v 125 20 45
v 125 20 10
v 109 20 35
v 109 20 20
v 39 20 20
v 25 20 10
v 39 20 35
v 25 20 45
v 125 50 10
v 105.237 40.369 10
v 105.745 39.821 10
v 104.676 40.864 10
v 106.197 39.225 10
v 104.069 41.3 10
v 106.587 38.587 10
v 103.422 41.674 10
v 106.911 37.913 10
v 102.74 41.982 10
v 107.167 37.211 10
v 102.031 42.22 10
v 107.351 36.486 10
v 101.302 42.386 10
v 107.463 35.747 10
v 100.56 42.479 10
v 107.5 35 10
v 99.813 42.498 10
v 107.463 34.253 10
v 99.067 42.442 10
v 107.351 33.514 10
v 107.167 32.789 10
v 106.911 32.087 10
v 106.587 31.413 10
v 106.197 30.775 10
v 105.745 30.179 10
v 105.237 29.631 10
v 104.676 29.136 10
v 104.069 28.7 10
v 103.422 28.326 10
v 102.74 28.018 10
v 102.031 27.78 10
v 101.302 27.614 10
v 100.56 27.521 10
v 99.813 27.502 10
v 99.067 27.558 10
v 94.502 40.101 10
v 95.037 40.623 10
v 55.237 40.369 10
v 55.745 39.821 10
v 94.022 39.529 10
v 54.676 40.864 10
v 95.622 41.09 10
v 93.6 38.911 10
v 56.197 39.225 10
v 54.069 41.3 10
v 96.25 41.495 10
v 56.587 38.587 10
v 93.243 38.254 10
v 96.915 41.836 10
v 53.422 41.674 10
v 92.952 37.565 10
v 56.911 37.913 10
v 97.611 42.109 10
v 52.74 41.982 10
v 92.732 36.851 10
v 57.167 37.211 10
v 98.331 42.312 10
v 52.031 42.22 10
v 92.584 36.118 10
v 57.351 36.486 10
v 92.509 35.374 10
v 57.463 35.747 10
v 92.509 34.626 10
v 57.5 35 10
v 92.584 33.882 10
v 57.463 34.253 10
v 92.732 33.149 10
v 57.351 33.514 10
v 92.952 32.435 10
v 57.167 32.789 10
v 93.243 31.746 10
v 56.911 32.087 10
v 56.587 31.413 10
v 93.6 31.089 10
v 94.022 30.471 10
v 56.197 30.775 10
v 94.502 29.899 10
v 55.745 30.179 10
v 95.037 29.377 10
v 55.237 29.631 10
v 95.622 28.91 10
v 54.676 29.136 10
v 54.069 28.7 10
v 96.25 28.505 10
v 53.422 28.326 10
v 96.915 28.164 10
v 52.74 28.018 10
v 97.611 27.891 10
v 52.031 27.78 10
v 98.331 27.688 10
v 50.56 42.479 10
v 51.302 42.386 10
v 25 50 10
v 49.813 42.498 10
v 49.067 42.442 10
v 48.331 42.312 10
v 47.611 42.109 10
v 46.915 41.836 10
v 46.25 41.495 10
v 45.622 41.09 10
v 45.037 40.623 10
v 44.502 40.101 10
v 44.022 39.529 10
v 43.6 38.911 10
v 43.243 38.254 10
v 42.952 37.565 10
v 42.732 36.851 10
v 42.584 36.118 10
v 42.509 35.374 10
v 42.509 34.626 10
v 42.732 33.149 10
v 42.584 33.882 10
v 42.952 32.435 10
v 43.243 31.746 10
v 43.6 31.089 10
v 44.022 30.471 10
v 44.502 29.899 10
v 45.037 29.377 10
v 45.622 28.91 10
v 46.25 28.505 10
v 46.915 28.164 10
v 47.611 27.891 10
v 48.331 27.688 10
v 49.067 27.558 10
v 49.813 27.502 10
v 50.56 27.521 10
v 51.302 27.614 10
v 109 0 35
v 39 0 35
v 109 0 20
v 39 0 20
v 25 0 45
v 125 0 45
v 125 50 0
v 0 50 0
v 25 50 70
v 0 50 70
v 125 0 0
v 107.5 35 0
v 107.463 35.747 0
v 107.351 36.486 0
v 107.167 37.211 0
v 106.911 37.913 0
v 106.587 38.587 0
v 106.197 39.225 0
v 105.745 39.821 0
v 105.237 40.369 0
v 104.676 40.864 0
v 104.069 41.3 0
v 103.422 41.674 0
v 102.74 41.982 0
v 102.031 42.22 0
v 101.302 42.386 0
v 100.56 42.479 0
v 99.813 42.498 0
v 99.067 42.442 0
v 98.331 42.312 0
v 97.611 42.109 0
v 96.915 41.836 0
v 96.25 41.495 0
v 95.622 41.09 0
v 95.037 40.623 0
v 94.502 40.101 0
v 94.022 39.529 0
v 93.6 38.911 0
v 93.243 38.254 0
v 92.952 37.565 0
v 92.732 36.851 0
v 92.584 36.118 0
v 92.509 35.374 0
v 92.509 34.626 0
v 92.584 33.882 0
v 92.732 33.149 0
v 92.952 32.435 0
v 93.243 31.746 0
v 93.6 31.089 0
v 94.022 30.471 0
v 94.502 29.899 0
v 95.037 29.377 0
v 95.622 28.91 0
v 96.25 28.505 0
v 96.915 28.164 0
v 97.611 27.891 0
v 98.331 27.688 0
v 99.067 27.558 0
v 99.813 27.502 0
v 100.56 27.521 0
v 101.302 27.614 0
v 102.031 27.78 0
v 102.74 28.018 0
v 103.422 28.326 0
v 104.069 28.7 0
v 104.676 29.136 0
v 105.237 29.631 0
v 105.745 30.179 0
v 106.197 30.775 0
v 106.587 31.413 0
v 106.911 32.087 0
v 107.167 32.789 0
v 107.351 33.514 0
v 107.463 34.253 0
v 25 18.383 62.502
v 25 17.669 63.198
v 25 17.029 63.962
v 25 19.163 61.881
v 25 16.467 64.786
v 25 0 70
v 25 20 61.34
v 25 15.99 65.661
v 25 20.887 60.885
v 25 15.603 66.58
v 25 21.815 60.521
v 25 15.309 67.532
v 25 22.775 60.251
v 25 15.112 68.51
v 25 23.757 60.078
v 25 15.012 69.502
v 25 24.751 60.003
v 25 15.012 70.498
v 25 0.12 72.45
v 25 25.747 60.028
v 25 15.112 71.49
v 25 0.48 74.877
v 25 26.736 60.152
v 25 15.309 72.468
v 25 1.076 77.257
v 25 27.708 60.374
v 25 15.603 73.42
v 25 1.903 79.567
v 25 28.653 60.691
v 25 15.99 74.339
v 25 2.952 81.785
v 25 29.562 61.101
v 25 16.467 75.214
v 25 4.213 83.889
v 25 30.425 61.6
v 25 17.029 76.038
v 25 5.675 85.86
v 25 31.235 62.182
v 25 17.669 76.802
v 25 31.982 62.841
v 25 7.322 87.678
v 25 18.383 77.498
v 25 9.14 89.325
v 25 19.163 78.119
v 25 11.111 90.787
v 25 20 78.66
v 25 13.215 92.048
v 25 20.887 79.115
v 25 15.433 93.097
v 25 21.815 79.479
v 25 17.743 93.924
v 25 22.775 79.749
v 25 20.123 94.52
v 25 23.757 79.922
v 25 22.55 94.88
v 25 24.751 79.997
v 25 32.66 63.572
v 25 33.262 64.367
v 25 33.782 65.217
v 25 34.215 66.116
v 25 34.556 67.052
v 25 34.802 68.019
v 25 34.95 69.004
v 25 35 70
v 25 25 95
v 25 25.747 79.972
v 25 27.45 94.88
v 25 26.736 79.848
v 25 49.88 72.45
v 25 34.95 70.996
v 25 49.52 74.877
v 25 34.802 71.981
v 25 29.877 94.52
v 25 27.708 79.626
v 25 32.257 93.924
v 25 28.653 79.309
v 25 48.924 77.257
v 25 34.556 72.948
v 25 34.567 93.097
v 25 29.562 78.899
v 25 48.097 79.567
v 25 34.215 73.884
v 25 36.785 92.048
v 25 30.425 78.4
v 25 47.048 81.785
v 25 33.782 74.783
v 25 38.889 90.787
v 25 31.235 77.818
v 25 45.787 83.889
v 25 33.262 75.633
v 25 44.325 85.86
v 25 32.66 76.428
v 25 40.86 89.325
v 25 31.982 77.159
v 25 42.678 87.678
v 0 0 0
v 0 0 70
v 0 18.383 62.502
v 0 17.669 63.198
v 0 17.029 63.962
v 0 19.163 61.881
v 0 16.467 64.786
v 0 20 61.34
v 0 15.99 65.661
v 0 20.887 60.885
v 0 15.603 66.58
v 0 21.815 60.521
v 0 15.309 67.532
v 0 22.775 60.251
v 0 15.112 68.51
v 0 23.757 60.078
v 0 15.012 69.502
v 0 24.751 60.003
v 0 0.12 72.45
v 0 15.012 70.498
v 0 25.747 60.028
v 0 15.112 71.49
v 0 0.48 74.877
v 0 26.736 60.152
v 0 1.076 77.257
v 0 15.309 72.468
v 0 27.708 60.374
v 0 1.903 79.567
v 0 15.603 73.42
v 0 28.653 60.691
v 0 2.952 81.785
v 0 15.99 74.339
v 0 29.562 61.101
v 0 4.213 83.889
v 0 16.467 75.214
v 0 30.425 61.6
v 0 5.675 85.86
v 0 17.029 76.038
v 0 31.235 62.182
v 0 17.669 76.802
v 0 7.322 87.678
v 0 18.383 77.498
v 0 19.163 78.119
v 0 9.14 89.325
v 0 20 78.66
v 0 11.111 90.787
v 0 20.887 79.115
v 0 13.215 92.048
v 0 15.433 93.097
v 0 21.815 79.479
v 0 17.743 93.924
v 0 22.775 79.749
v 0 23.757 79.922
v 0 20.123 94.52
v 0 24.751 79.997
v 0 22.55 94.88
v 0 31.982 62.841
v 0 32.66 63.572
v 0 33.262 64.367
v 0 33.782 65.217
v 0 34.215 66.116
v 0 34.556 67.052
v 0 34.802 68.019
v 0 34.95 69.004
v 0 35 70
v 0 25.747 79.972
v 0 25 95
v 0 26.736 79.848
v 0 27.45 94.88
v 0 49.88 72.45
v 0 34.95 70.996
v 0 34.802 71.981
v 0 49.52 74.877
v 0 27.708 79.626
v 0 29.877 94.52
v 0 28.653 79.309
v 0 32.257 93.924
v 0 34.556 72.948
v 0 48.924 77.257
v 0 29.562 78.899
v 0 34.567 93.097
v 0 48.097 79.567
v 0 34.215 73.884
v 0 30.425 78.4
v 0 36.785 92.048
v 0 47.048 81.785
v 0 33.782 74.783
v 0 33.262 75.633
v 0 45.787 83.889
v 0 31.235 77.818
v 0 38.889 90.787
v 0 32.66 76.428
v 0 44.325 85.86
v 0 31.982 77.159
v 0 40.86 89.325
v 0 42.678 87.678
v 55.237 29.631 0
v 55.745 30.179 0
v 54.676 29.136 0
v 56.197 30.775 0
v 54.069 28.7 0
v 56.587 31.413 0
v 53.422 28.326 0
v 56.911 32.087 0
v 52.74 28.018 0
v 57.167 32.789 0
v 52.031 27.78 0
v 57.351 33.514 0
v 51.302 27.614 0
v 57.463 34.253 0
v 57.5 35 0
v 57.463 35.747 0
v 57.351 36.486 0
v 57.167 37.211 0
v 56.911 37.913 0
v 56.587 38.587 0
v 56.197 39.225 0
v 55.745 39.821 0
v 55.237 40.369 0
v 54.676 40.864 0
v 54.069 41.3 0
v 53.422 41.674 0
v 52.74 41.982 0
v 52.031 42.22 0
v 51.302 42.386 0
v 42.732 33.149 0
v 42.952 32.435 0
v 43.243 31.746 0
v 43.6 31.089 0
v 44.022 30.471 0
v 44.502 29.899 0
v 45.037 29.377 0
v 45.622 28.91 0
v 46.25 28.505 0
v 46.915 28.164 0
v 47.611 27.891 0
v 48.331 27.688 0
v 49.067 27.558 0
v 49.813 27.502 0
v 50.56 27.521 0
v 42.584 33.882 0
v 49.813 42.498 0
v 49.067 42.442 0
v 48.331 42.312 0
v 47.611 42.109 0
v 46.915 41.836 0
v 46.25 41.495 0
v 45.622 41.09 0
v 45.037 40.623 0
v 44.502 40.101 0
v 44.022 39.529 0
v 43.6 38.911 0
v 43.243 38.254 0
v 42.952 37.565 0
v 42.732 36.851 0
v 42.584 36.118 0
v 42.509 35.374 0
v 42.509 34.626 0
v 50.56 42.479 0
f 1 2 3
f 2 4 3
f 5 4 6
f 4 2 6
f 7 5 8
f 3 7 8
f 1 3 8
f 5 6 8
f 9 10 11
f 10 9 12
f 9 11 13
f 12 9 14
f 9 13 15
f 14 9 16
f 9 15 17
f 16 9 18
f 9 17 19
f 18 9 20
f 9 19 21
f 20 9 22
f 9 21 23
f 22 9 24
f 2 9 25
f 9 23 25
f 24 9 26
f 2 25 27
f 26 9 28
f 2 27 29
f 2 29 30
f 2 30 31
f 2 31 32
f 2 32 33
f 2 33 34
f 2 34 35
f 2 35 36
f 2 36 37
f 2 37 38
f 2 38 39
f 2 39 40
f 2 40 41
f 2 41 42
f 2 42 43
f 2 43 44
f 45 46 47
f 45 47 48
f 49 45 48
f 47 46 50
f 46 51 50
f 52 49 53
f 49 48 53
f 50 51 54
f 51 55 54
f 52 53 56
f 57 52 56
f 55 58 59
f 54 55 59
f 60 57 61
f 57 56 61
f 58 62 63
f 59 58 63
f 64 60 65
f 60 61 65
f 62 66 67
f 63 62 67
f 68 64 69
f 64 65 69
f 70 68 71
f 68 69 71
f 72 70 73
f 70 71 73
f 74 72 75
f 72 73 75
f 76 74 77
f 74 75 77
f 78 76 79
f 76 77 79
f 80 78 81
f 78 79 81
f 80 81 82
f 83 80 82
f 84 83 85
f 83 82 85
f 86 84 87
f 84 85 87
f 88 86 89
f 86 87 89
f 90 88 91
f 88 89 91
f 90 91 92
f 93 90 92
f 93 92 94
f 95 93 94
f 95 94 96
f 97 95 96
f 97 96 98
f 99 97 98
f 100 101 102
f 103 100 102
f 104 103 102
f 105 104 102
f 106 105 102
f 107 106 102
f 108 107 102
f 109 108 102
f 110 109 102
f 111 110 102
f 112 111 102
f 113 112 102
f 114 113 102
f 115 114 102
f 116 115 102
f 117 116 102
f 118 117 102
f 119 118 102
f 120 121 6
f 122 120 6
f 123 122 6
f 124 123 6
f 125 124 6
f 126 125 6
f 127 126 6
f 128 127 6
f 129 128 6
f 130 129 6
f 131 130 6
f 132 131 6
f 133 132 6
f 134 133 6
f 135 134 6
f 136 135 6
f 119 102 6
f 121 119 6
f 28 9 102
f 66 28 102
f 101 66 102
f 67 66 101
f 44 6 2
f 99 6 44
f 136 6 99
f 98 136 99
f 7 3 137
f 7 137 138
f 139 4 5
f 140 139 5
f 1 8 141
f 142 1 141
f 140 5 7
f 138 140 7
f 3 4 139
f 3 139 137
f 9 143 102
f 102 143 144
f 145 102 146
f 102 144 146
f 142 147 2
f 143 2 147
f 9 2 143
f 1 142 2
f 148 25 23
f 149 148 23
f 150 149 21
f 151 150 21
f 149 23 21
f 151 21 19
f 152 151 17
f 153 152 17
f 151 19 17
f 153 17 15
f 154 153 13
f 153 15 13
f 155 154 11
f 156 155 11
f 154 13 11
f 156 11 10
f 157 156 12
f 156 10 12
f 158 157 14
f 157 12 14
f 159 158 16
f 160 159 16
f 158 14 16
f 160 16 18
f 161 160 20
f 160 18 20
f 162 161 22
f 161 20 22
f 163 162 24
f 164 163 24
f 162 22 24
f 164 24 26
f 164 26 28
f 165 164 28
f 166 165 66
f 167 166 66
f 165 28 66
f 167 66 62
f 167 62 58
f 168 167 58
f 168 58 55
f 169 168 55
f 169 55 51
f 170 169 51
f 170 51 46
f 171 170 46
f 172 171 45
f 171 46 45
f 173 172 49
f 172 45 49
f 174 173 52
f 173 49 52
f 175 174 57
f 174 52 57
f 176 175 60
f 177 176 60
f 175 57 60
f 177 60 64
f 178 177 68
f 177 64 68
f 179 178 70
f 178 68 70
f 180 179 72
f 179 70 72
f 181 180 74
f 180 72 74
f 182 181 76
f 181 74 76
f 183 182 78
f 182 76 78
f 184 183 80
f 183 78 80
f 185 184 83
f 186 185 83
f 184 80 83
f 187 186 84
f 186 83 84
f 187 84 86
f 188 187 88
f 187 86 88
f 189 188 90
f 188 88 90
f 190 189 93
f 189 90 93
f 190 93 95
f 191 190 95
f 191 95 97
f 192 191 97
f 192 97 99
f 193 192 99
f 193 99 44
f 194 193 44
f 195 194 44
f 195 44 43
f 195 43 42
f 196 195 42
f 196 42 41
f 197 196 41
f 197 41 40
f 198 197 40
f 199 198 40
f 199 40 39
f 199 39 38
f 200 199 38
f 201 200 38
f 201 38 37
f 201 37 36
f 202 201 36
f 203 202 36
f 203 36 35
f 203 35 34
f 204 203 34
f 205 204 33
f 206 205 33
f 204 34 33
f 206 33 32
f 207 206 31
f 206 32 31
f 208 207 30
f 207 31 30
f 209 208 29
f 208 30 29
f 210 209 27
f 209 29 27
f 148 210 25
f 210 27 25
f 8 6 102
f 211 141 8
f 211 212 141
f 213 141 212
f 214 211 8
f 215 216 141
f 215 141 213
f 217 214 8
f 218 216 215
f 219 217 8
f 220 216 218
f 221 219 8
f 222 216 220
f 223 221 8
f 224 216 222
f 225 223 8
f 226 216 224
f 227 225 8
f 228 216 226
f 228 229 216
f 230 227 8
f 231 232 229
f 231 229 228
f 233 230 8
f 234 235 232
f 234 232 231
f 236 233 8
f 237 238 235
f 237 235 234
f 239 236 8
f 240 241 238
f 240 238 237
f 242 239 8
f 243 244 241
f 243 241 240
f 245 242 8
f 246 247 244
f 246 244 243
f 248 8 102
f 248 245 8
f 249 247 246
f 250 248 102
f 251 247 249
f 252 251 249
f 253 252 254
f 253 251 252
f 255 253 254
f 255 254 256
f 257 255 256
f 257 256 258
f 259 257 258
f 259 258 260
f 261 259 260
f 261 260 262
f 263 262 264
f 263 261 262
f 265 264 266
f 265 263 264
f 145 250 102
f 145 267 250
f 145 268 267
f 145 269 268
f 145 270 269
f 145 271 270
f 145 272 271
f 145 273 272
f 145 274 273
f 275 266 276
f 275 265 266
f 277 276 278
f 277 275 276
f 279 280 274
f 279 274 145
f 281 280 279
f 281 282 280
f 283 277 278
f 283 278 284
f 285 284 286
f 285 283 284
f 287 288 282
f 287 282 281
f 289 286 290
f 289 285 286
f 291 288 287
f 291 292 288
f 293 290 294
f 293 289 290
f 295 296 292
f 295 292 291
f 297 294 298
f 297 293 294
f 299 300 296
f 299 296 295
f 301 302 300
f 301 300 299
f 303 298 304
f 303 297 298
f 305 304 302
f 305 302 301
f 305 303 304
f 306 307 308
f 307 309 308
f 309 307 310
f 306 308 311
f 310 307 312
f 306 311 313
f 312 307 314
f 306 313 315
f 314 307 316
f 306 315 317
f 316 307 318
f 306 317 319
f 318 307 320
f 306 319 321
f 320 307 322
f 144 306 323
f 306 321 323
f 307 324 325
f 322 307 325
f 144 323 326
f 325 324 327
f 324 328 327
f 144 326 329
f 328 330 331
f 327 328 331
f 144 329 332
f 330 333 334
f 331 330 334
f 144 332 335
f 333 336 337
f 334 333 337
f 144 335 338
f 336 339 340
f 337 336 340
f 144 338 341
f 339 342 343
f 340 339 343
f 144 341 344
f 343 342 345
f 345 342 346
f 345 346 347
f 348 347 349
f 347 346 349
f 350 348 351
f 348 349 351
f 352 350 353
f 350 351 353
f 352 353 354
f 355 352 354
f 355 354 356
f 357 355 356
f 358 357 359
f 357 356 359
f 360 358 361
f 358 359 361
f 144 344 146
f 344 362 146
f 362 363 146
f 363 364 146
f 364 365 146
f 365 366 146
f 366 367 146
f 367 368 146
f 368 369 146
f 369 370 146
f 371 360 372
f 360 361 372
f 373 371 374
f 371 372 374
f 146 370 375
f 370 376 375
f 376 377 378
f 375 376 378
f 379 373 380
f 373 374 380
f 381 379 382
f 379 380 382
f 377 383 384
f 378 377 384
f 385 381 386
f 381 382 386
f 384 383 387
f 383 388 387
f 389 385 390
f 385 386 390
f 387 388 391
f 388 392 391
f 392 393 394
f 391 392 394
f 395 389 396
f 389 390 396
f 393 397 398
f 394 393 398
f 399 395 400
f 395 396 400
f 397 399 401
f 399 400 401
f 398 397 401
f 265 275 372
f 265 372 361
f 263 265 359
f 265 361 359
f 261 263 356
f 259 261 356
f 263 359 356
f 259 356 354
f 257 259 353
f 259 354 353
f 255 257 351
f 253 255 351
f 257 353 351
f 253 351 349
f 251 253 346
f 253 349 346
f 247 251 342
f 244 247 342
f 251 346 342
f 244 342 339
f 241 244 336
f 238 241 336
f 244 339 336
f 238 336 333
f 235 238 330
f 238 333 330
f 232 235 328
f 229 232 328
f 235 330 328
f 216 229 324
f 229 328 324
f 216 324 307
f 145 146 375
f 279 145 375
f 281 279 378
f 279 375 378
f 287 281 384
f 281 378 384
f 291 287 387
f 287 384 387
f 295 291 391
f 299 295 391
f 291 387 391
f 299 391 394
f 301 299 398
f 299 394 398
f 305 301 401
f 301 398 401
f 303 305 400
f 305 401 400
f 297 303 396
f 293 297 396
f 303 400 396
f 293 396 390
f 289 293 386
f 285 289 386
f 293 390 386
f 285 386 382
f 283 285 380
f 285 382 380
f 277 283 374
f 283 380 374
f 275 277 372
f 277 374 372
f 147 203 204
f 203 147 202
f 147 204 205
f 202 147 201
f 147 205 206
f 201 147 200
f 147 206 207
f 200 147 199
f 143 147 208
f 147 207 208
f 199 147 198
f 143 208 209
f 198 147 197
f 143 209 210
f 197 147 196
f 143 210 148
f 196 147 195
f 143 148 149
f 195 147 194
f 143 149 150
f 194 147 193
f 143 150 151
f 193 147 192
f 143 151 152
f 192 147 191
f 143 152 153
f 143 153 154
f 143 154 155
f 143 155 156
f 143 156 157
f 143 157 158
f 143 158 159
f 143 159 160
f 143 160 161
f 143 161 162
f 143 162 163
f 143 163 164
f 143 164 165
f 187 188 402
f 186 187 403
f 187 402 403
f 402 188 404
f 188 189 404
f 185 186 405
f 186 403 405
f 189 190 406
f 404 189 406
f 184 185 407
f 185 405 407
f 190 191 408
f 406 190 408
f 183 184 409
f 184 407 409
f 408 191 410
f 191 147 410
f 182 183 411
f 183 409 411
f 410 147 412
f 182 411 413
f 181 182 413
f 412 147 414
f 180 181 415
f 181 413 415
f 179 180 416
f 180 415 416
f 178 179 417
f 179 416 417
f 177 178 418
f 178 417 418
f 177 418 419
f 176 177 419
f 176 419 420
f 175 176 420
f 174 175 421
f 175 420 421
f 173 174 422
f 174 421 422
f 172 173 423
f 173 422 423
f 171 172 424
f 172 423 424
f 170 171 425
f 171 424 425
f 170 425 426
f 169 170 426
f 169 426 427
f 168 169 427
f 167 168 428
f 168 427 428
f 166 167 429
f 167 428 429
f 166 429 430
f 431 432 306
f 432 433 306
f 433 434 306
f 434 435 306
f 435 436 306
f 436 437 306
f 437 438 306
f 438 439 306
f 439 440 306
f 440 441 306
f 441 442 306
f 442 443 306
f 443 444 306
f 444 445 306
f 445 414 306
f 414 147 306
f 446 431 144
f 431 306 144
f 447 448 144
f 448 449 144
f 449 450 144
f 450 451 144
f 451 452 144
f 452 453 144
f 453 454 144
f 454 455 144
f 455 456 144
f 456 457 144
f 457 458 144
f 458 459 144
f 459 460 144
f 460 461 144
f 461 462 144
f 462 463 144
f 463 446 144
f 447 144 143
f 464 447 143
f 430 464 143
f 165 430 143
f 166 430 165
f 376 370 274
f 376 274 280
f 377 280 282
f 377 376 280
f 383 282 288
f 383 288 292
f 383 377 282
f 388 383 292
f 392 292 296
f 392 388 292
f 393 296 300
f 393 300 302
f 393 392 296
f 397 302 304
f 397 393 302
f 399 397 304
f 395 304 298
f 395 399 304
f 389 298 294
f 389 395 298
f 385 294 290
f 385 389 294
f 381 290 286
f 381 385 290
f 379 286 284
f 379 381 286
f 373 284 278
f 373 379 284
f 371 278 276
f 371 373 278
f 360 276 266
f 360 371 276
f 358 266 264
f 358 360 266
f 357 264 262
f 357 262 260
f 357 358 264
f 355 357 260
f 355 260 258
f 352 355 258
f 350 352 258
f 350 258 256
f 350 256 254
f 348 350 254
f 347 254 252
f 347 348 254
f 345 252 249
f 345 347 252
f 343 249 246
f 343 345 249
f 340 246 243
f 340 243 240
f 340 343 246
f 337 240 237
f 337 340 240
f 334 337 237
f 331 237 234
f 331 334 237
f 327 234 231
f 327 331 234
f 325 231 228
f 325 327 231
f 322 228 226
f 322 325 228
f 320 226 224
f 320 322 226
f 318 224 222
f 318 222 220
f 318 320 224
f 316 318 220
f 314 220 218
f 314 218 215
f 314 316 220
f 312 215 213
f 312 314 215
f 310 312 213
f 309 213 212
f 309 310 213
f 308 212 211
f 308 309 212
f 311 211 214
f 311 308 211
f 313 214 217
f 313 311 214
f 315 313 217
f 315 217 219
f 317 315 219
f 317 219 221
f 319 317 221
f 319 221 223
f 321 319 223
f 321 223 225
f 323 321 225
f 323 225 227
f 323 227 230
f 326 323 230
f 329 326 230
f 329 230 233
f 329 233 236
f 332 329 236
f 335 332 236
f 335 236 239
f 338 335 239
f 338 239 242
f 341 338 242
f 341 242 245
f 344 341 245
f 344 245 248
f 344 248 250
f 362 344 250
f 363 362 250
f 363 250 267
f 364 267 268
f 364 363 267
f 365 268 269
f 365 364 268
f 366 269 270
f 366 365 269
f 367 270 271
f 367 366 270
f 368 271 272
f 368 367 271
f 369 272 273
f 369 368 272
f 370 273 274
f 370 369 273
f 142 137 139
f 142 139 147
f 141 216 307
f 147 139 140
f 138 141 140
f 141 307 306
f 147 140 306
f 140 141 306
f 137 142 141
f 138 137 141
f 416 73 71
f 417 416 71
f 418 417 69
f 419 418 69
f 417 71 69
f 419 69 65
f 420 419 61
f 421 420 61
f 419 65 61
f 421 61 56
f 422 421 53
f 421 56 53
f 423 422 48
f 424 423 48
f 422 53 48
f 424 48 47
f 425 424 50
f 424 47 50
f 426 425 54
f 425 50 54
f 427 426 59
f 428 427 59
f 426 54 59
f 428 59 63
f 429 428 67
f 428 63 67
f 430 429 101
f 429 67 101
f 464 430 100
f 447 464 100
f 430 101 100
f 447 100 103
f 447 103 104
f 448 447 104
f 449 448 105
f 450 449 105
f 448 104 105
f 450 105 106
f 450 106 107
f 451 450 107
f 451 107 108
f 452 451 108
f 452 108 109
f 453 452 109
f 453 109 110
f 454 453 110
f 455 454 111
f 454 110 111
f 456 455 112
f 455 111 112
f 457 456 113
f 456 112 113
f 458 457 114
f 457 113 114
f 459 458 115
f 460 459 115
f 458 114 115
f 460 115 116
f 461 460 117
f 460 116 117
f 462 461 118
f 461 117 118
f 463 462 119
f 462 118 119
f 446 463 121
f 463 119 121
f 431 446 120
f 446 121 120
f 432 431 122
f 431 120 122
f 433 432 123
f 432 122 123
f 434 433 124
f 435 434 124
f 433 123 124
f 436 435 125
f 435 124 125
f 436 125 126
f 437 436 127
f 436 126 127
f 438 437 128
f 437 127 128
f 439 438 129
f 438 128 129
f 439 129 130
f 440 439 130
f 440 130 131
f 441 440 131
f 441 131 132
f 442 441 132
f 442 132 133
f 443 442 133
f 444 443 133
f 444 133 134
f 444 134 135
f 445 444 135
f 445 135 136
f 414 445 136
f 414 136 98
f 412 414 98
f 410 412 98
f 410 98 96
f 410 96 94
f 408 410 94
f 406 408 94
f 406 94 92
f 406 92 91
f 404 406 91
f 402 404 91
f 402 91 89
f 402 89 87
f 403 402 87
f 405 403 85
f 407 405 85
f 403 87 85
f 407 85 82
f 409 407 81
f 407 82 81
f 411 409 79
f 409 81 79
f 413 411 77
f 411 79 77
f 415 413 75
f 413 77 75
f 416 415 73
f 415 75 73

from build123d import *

# Parameters (mm, degrees)
F0_R     = 10
F1_DEPTH = 25
F3_DEPTH = 100
F4_W     = 70
F4_H     = 15
F5_DEPTH = 20
F6_R     = 7.5
F7_DEPTH = 10


with BuildPart() as f1:
    # F0 (on Right) → F1 (new body)
    with BuildSketch(Plane.YZ):
        with BuildLine():
            Line((0, 70), (0, 0))
            Line((0, 0), (50, 0))
            Line((50, 0), (50, 70))
            ThreePointArc((50, 70), (42.67767, 87.67767), (25, 95))
            ThreePointArc((25, 95), (7.32233, 87.67767), (0, 70))
        make_face()
        with Locations((25, 70)):
            Circle(F0_R, mode=Mode.SUBTRACT)
    extrude(amount=F1_DEPTH)

    # F2 (on face) → F3 (join)
    with BuildSketch(Plane.YZ.offset(25)):
        Polygon((0, 45), (0, 0), (50, 0), (50, 10), (20, 10), (20, 45), align=None)
    extrude(amount=F3_DEPTH)

    # F4 (on face) → F5 (cut)
    with BuildSketch(Plane(origin=(0, 20, 0), x_dir=(-1, 0, 0), z_dir=(0, 1, 0))):
        with Locations((-74, 27.5)):
            Rectangle(F4_W, F4_H)
    extrude(amount=-F5_DEPTH, mode=Mode.SUBTRACT)

    # F6 (on face) → F7 (cut)
    with BuildSketch(Plane.XY.offset(10)):
        with Locations((100, 35)):
            Circle(F6_R)
        with Locations((50, 35)):
            Circle(F6_R)
    extrude(amount=-F7_DEPTH, mode=Mode.SUBTRACT)


solid = f1.part
